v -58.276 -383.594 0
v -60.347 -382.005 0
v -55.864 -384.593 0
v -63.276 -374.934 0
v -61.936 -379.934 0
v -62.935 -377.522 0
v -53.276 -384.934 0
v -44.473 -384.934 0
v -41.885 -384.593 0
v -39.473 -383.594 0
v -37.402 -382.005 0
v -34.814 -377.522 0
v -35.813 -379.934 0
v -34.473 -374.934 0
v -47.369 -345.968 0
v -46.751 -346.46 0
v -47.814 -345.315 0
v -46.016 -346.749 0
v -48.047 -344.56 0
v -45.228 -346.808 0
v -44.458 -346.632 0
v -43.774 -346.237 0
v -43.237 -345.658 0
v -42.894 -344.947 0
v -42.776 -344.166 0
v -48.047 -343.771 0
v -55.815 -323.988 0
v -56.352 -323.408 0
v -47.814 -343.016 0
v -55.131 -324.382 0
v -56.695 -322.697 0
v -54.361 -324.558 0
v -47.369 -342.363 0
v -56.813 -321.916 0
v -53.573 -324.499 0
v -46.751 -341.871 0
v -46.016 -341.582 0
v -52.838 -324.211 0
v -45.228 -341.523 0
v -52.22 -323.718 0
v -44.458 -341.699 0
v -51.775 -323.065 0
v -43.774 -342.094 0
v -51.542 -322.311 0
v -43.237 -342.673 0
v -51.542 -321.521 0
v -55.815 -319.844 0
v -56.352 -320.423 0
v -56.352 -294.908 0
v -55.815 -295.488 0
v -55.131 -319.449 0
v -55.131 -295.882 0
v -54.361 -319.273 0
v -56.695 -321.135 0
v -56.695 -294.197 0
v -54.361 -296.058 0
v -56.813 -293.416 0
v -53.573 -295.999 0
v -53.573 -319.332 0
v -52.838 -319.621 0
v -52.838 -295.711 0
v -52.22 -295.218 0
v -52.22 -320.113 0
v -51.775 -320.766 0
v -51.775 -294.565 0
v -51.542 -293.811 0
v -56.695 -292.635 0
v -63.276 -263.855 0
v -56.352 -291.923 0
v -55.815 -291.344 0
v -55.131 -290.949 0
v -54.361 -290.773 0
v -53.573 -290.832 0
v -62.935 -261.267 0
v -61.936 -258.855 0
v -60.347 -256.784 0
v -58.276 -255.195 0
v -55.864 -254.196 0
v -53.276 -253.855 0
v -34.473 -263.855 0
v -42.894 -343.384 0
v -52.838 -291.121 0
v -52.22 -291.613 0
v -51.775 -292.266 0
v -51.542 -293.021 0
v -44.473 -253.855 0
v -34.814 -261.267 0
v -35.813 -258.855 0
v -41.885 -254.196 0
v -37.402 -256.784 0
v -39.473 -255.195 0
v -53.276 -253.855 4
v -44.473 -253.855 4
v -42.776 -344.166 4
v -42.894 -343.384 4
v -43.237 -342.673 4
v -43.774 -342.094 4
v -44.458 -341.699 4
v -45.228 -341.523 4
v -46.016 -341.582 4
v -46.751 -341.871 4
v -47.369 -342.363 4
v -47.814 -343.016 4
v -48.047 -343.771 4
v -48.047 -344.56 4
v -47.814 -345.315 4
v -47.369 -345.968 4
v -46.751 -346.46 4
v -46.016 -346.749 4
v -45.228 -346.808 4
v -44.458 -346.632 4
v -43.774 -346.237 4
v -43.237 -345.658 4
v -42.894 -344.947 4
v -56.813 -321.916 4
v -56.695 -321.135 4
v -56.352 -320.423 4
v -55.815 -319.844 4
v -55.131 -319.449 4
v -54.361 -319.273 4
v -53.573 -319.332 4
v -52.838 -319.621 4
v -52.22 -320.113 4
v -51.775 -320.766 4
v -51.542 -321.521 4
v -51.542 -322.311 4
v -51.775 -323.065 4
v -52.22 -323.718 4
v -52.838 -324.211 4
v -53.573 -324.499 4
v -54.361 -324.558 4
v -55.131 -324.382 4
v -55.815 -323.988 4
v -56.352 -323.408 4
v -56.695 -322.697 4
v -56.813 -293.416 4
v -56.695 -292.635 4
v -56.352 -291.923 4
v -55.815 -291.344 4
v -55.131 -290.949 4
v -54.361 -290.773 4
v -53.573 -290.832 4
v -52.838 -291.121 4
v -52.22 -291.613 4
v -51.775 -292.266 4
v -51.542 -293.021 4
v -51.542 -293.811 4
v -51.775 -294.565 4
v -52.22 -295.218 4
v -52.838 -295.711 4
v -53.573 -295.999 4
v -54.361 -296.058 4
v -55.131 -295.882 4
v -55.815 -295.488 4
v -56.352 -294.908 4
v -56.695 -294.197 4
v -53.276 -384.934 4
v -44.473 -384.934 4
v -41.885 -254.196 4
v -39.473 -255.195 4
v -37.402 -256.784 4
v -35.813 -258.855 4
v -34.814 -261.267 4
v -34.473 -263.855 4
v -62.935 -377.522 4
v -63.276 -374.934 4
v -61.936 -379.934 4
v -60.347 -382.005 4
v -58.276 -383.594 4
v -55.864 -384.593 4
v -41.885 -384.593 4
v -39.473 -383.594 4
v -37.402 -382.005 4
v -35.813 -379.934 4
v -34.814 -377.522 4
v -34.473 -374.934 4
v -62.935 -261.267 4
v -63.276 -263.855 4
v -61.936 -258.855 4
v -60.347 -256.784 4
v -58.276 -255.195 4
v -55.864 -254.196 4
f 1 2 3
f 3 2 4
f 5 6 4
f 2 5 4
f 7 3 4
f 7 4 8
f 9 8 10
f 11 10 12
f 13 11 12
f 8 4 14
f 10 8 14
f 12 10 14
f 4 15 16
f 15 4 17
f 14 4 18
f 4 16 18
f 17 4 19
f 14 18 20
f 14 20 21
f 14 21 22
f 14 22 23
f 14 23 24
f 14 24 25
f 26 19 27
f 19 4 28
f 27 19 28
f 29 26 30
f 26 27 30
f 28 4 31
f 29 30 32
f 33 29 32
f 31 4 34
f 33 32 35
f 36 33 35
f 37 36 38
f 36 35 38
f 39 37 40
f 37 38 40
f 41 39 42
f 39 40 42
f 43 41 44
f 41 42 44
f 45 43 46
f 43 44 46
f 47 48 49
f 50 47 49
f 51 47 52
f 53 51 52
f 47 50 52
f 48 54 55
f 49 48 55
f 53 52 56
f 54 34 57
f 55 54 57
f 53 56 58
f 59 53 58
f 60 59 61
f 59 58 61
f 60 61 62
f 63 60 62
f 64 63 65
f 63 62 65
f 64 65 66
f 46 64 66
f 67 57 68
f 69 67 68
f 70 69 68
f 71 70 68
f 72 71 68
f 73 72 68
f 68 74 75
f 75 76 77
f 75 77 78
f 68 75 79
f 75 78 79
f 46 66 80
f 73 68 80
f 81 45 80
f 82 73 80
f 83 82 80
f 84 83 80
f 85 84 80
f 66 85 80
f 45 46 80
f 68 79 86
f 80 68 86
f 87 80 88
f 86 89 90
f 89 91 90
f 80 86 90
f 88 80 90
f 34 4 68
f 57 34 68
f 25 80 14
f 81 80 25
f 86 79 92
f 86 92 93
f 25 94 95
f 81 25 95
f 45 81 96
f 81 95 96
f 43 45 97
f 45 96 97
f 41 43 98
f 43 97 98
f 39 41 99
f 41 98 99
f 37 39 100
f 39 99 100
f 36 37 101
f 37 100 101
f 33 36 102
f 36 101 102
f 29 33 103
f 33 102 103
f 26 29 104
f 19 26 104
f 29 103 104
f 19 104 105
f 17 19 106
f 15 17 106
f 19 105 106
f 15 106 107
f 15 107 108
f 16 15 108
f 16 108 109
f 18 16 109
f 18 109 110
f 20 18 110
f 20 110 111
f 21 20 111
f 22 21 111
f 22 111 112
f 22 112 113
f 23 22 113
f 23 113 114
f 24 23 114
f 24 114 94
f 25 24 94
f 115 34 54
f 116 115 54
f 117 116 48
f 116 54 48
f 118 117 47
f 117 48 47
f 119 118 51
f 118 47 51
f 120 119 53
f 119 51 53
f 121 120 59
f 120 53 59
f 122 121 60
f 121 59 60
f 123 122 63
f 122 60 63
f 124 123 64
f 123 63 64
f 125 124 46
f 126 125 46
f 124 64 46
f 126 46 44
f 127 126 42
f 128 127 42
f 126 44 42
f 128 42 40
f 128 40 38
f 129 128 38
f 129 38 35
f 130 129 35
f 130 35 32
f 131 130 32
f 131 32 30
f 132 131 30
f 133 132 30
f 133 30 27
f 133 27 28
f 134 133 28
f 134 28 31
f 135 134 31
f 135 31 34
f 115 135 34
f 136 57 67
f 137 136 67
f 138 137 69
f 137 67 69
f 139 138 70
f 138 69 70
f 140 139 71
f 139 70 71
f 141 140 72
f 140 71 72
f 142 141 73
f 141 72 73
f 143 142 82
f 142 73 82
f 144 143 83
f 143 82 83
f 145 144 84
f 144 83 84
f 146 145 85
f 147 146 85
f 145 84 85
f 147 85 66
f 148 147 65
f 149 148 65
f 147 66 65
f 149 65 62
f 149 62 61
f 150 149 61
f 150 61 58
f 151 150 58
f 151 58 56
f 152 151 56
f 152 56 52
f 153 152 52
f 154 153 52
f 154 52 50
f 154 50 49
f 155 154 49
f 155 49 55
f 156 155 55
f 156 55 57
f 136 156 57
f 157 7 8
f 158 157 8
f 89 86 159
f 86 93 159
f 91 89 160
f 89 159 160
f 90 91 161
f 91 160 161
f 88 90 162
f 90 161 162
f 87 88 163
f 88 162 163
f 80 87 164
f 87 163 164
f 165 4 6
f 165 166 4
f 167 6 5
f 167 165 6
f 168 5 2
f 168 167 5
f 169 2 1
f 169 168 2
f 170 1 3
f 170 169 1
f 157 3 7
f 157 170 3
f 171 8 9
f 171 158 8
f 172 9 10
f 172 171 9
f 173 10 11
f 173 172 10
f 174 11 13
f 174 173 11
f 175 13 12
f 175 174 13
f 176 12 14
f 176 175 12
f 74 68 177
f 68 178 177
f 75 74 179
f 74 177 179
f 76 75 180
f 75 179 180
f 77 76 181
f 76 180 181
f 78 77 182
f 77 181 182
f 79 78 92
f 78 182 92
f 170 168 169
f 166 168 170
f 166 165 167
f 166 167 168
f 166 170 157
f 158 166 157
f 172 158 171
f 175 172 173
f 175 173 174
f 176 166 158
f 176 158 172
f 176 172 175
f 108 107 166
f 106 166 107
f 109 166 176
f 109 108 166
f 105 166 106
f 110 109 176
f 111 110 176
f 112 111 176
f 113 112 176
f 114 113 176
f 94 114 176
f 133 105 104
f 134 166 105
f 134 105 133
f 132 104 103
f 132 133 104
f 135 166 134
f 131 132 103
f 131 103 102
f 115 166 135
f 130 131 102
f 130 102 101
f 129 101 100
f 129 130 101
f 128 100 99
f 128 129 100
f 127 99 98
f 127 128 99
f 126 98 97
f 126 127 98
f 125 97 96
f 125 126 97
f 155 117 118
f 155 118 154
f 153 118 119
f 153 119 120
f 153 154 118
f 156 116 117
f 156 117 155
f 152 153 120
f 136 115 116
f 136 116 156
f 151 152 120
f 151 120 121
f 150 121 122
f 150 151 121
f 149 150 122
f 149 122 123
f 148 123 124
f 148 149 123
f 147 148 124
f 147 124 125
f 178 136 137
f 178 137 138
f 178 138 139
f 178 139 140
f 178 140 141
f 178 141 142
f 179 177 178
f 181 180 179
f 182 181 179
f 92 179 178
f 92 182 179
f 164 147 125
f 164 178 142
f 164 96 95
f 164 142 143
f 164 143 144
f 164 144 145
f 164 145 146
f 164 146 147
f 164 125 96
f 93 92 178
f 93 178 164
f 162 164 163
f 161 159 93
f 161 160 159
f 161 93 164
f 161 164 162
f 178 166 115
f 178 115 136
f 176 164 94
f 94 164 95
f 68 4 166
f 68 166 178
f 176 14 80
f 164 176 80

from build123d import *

# Parameters (mm, degrees)
SKETCH1_W            = 28.802861634
SKETCH1_H            = 131.078546172
BOSS_EXTRUDE1_DEPTH  = 4
M5_CLEARANCE_HOLE1_D = 5.3
FILLET1_R            = 10
M5_CLEARANCE_HOLE2_D = 5.3


with BuildPart() as part:
    # Sketch1 → Boss-Extrude1 (new body)
    with BuildSketch(Plane.XY):
        with Locations((-48.87450938, -319.394379884)):
            Rectangle(SKETCH1_W, SKETCH1_H)
    extrude(amount=BOSS_EXTRUDE1_DEPTH)

    # M5 Clearance Hole1 (through all)
    with Locations(Plane.XY.offset(4)):
        with Locations((-54.16270611, -321.915681156), (-54.16270611, -293.415681156)):
            Hole(M5_CLEARANCE_HOLE1_D / 2)

    # Fillet1
    fillet1_edges = [part.edges().sort_by_distance(p)[0] for p in [
        (-63.275940197, -253.855106798, 2),
        (-34.473078563, -253.855106798, 2),
        (-34.473078563, -384.93365297, 2),
        (-63.275940197, -384.93365297, 2),
    ]]
    fillet(fillet1_edges, radius=FILLET1_R)

    # M5 Clearance Hole2 (through all)
    with Locations(Plane(origin=(0, 0, 0), x_dir=(-1, 0, 0), z_dir=(0, 0, -1))):
        with Locations((45.426427008, -344.165502047)):
            Hole(M5_CLEARANCE_HOLE2_D / 2)


solid = part.part
